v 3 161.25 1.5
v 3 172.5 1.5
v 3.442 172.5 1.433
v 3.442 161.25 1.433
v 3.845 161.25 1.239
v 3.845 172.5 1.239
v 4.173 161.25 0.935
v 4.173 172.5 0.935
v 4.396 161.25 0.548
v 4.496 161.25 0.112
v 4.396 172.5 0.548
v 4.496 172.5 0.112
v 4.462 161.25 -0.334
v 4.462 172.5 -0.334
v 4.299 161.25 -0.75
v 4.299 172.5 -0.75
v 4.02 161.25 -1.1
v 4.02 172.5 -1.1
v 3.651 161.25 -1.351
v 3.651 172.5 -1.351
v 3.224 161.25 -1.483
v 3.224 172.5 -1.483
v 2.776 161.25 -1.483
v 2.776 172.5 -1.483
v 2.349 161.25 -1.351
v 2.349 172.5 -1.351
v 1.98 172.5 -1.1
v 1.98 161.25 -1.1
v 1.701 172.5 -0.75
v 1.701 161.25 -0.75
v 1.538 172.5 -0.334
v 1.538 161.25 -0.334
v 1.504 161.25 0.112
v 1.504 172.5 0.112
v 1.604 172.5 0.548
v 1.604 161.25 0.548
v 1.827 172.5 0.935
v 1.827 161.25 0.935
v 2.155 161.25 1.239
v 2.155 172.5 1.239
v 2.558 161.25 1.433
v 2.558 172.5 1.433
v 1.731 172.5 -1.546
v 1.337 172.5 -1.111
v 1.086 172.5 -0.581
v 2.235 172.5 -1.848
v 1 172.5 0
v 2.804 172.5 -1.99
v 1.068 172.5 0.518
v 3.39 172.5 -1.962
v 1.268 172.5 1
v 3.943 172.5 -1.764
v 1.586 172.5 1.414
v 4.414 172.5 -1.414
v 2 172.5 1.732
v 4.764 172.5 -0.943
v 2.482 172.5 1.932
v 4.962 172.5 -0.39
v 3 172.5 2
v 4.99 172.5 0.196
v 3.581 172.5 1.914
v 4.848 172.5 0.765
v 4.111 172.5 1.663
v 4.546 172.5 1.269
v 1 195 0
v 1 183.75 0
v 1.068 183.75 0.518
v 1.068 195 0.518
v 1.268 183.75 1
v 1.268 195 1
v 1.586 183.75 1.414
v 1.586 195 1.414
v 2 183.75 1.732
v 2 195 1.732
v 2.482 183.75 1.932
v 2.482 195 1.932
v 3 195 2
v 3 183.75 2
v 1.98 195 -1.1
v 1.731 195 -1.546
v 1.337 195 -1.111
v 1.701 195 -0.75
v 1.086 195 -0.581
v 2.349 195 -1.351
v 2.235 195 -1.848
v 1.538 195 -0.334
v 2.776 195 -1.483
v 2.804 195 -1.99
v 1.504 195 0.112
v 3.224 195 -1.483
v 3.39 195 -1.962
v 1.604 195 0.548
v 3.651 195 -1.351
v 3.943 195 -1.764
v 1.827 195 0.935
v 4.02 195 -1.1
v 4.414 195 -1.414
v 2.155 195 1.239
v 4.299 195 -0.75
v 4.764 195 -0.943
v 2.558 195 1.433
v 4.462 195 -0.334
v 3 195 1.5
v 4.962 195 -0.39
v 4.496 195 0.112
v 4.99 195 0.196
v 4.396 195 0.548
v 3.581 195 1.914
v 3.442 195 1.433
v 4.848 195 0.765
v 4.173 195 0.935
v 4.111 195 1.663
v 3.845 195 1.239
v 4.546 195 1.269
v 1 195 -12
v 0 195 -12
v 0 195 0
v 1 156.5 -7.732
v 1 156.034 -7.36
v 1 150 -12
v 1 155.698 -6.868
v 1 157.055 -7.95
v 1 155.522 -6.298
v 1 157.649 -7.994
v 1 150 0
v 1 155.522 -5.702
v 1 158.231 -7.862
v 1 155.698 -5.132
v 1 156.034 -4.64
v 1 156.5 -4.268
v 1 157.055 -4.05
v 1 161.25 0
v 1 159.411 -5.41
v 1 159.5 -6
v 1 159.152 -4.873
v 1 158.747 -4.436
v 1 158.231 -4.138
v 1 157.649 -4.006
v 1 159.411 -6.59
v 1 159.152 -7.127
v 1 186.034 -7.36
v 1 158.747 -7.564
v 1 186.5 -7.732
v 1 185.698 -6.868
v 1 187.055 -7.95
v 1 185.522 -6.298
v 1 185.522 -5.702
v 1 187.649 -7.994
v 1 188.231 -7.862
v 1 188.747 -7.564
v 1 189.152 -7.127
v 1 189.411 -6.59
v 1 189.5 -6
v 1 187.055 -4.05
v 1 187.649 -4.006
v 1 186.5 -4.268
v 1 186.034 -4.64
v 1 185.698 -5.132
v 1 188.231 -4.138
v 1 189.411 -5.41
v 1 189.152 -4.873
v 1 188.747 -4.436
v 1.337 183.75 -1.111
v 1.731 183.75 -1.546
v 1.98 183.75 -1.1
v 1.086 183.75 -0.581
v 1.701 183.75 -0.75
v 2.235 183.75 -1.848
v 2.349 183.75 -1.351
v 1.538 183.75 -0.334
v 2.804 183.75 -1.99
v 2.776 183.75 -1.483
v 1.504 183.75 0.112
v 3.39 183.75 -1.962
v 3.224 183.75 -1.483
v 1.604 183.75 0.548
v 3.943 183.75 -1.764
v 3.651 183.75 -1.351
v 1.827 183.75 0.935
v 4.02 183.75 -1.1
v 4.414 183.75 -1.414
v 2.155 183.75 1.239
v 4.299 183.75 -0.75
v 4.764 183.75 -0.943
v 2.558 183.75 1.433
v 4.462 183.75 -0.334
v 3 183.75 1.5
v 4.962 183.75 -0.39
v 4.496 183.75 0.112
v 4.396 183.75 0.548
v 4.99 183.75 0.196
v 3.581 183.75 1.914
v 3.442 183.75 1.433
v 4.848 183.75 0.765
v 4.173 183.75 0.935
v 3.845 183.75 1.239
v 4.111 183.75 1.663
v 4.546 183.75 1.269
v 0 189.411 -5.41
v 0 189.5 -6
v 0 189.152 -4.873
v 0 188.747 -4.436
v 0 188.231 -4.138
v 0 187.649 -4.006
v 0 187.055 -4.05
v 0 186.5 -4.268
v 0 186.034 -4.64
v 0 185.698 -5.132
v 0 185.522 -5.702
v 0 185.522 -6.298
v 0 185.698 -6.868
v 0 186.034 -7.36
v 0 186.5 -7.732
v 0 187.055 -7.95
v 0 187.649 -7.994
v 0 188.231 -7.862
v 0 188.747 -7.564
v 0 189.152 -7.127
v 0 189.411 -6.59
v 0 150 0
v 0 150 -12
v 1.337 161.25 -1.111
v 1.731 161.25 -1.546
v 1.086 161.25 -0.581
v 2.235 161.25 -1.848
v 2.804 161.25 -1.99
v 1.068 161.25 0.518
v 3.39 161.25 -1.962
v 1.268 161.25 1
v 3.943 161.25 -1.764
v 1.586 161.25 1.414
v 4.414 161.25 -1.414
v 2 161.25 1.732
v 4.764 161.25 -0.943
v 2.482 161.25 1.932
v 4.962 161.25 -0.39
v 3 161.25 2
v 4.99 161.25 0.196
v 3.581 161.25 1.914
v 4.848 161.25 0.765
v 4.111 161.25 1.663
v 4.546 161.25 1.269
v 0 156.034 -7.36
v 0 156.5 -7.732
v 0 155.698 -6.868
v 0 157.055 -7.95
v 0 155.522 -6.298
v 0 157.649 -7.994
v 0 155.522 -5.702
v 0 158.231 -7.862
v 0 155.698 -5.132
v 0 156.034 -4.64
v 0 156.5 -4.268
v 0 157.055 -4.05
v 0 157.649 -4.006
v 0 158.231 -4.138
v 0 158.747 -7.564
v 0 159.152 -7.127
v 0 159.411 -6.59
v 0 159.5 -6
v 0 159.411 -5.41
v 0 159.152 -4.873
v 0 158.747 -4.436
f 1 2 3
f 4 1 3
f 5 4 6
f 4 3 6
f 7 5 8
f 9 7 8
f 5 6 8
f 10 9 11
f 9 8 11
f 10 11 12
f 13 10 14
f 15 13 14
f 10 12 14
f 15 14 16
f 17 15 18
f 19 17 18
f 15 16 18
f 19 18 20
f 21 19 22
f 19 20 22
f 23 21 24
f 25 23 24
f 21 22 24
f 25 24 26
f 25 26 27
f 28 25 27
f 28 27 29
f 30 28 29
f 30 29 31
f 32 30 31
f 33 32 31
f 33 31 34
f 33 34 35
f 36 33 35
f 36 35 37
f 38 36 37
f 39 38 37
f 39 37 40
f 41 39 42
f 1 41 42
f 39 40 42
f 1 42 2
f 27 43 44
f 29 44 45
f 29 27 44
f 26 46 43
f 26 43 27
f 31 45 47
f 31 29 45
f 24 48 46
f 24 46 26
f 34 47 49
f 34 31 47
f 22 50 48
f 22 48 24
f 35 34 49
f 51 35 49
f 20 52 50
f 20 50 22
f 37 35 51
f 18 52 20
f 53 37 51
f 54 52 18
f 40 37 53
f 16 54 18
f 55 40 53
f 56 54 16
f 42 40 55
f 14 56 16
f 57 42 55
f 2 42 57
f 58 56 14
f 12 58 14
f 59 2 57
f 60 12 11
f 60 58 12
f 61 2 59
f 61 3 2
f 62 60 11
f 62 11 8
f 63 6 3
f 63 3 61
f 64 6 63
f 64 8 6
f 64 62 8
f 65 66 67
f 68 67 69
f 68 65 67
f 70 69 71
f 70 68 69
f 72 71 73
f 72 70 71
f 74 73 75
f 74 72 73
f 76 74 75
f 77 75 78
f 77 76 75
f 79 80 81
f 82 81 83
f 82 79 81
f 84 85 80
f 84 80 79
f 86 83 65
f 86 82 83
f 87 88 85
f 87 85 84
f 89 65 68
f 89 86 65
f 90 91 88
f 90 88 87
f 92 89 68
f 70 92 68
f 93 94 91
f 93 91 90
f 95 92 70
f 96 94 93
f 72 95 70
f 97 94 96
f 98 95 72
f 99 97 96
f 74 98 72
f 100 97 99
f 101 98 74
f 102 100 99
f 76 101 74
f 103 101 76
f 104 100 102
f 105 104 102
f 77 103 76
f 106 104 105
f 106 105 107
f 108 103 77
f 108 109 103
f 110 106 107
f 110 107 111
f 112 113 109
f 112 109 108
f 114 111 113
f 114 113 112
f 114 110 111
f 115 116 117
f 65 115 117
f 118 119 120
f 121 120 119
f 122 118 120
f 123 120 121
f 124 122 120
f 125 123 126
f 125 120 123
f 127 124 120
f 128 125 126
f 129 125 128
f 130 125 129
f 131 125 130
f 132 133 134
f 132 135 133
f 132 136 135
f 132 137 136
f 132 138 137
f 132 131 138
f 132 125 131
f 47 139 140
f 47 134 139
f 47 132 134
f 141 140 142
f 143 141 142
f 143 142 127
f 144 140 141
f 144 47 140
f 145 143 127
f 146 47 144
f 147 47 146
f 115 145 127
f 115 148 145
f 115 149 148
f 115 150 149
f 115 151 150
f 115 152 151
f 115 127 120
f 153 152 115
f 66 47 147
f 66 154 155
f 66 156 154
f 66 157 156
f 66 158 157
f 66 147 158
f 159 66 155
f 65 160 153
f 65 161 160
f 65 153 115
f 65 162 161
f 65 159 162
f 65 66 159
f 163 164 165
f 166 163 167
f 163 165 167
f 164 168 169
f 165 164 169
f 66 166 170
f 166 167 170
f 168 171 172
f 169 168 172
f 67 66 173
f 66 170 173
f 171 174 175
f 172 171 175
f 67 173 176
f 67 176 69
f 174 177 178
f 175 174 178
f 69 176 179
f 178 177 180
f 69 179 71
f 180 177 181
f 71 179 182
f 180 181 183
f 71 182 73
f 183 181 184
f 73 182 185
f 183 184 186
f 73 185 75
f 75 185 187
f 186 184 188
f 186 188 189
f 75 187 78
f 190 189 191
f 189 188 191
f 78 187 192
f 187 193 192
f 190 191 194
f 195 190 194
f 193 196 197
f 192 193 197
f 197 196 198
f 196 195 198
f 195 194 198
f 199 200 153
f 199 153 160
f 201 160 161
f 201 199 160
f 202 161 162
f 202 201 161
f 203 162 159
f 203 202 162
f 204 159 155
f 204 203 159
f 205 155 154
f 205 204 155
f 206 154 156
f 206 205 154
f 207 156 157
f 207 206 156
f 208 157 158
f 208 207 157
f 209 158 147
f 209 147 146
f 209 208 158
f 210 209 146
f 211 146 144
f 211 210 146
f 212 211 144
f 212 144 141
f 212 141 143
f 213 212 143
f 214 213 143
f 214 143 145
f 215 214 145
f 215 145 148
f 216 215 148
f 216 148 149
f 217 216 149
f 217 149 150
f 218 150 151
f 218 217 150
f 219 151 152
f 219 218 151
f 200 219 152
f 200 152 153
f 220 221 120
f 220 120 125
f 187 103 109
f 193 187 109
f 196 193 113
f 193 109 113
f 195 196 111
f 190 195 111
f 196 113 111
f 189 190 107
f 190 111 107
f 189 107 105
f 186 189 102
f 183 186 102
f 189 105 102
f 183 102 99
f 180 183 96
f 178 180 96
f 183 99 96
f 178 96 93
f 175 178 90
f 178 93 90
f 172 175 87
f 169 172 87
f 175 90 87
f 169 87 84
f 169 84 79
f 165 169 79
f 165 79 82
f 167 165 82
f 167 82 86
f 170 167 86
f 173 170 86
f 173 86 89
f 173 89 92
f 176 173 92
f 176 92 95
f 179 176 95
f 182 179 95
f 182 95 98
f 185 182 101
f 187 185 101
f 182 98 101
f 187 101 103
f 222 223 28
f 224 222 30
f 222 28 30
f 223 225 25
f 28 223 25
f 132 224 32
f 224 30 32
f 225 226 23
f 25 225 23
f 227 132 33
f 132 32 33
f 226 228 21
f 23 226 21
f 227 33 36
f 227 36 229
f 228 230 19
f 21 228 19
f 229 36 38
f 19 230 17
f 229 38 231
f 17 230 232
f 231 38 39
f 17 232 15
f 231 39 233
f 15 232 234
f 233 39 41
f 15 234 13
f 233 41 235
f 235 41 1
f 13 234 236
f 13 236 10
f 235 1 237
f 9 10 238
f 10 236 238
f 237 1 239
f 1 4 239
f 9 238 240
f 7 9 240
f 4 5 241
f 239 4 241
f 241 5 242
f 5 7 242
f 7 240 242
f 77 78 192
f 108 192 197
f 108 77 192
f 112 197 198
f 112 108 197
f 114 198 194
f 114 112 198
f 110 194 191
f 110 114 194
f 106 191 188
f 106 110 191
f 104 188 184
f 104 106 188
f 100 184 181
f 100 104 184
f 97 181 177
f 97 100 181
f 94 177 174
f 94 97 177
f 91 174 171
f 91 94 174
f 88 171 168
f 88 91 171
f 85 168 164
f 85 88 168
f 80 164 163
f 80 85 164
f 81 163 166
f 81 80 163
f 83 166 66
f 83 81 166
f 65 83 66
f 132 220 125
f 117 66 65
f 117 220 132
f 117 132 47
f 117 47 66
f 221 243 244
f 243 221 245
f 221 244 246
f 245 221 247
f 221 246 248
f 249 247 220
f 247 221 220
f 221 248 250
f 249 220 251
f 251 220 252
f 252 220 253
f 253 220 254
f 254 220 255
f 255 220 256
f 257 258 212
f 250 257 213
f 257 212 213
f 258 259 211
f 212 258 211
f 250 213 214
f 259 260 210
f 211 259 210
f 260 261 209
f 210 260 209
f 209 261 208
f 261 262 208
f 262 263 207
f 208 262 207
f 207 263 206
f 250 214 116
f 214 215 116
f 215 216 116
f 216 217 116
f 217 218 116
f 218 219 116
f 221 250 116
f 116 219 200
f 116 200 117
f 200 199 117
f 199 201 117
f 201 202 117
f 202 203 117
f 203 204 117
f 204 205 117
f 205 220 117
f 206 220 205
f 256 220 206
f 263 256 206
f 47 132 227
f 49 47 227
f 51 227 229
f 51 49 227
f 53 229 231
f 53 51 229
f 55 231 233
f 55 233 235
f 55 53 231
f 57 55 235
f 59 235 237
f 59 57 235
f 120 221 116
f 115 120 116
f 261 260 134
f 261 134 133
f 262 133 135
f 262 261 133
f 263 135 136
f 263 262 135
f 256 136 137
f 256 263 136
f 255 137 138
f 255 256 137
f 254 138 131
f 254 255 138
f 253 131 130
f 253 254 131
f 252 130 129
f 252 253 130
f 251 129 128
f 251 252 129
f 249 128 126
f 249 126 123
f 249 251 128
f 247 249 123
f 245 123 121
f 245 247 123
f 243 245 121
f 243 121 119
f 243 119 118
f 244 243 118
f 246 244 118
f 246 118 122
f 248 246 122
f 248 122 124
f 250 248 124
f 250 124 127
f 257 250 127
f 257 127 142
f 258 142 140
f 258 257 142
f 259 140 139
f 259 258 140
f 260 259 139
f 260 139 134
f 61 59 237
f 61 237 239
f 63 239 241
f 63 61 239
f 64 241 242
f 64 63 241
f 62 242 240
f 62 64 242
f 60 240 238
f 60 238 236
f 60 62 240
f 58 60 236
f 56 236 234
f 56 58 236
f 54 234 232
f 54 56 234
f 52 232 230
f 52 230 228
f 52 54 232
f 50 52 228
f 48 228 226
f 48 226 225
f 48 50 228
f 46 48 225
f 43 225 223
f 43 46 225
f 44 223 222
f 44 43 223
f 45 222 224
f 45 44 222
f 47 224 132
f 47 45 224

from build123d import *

# Parameters (mm, degrees)
SKETCH007_W            = 45
SKETCH007_H            = 12
SKETCH007_R            = 2
PAD007_DEPTH           = 1
SKETCH008_R            = 2
SKETCH008_R_2          = 1.5
PAD008_DEPTH           = 11.25
LINEARPATTERN003_COUNT = 2
LINEARPATTERN003_PITCH = 22.5


with BuildPart() as part:
    # Sketch007 → Pad007 (new body)
    with BuildSketch(Plane.YZ):
        with Locations((172.5, -6)):
            Rectangle(SKETCH007_W, SKETCH007_H)
        with Locations((157.5, -6)):
            Circle(SKETCH007_R, mode=Mode.SUBTRACT)
        with Locations((187.5, -6)):
            Circle(SKETCH007_R, mode=Mode.SUBTRACT)
    extrude(amount=PAD007_DEPTH)

    # Sketch008 (on Face2 of Pad007) → Pad008 (join)
    with BuildSketch(Plane.ZX.offset(195)):
        with Locations((0, 3)):
            Circle(SKETCH008_R)
        with Locations((0, 3)):
            Circle(SKETCH008_R_2, mode=Mode.SUBTRACT)
    pad008 = extrude(amount=-PAD008_DEPTH)

    # LinearPattern003: Pad008 ×2
    with Locations(*[(0, -i * LINEARPATTERN003_PITCH, 0) for i in range(1, LINEARPATTERN003_COUNT)]):
        add(pad008)


solid = part.part
